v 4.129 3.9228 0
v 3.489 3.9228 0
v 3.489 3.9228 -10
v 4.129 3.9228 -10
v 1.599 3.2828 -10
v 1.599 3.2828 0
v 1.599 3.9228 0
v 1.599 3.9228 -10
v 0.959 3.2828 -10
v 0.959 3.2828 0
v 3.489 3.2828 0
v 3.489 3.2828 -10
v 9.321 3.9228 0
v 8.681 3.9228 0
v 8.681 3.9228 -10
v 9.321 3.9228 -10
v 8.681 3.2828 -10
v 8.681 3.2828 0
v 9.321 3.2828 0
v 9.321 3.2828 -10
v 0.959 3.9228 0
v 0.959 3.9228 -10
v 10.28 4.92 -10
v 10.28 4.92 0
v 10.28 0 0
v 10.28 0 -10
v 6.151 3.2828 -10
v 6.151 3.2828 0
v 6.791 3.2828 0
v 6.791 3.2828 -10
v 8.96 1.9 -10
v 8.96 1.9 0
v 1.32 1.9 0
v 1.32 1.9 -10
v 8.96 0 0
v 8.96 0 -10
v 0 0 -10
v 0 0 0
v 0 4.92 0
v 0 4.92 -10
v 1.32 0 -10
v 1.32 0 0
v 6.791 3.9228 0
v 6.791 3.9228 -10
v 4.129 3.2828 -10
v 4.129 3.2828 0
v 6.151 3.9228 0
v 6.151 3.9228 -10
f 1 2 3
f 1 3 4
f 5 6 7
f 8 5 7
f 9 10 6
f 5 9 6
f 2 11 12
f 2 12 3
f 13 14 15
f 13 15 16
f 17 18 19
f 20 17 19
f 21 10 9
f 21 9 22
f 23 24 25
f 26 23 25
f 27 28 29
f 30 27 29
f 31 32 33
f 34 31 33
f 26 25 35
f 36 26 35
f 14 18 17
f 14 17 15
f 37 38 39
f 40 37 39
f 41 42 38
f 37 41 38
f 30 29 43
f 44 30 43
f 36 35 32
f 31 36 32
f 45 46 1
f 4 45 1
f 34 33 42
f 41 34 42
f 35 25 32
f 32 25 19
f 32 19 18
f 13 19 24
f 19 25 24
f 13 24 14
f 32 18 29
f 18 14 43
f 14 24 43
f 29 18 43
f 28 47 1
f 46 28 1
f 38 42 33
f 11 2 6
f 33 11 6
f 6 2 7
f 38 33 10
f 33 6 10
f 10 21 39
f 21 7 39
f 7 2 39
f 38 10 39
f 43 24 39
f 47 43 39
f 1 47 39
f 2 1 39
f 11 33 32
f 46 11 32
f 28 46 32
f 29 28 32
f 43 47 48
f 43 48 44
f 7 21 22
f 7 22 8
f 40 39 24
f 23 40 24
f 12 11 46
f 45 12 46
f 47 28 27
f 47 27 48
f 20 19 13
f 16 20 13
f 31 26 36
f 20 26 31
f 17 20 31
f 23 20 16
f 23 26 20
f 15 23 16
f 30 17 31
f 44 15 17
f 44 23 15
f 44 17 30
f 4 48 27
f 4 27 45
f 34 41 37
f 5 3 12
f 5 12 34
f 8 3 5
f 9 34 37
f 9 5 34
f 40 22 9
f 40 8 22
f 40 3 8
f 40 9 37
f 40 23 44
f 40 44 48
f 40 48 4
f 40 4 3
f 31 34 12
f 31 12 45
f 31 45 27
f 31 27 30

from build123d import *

# Parameters (mm, degrees)
SKETCH1_W           = 0.64
SKETCH1_H           = 0.64
BOSS_EXTRUDE1_DEPTH = 10


with BuildPart() as part:
    # Sketch1 → Boss-Extrude1 (new body)
    with BuildSketch(Plane.XY):
        Polygon((0, 4.92), (10.28, 4.92), (10.28, 0), (8.96, 0), (8.96, 1.9), (1.32, 1.9), (1.32, 0), (0, 0), align=None)
        with Locations((6.471040223, 3.602802159)):
            Rectangle(SKETCH1_W, SKETCH1_H, mode=Mode.SUBTRACT)
        with Locations((1.278959777, 3.602802159)):
            Rectangle(SKETCH1_W, SKETCH1_H, mode=Mode.SUBTRACT)
        with Locations((3.808959777, 3.602802159)):
            Rectangle(SKETCH1_W, SKETCH1_H, mode=Mode.SUBTRACT)
        with Locations((9.001040223, 3.602802159)):
            Rectangle(SKETCH1_W, SKETCH1_H, mode=Mode.SUBTRACT)
    extrude(amount=-BOSS_EXTRUDE1_DEPTH)


solid = part.part
